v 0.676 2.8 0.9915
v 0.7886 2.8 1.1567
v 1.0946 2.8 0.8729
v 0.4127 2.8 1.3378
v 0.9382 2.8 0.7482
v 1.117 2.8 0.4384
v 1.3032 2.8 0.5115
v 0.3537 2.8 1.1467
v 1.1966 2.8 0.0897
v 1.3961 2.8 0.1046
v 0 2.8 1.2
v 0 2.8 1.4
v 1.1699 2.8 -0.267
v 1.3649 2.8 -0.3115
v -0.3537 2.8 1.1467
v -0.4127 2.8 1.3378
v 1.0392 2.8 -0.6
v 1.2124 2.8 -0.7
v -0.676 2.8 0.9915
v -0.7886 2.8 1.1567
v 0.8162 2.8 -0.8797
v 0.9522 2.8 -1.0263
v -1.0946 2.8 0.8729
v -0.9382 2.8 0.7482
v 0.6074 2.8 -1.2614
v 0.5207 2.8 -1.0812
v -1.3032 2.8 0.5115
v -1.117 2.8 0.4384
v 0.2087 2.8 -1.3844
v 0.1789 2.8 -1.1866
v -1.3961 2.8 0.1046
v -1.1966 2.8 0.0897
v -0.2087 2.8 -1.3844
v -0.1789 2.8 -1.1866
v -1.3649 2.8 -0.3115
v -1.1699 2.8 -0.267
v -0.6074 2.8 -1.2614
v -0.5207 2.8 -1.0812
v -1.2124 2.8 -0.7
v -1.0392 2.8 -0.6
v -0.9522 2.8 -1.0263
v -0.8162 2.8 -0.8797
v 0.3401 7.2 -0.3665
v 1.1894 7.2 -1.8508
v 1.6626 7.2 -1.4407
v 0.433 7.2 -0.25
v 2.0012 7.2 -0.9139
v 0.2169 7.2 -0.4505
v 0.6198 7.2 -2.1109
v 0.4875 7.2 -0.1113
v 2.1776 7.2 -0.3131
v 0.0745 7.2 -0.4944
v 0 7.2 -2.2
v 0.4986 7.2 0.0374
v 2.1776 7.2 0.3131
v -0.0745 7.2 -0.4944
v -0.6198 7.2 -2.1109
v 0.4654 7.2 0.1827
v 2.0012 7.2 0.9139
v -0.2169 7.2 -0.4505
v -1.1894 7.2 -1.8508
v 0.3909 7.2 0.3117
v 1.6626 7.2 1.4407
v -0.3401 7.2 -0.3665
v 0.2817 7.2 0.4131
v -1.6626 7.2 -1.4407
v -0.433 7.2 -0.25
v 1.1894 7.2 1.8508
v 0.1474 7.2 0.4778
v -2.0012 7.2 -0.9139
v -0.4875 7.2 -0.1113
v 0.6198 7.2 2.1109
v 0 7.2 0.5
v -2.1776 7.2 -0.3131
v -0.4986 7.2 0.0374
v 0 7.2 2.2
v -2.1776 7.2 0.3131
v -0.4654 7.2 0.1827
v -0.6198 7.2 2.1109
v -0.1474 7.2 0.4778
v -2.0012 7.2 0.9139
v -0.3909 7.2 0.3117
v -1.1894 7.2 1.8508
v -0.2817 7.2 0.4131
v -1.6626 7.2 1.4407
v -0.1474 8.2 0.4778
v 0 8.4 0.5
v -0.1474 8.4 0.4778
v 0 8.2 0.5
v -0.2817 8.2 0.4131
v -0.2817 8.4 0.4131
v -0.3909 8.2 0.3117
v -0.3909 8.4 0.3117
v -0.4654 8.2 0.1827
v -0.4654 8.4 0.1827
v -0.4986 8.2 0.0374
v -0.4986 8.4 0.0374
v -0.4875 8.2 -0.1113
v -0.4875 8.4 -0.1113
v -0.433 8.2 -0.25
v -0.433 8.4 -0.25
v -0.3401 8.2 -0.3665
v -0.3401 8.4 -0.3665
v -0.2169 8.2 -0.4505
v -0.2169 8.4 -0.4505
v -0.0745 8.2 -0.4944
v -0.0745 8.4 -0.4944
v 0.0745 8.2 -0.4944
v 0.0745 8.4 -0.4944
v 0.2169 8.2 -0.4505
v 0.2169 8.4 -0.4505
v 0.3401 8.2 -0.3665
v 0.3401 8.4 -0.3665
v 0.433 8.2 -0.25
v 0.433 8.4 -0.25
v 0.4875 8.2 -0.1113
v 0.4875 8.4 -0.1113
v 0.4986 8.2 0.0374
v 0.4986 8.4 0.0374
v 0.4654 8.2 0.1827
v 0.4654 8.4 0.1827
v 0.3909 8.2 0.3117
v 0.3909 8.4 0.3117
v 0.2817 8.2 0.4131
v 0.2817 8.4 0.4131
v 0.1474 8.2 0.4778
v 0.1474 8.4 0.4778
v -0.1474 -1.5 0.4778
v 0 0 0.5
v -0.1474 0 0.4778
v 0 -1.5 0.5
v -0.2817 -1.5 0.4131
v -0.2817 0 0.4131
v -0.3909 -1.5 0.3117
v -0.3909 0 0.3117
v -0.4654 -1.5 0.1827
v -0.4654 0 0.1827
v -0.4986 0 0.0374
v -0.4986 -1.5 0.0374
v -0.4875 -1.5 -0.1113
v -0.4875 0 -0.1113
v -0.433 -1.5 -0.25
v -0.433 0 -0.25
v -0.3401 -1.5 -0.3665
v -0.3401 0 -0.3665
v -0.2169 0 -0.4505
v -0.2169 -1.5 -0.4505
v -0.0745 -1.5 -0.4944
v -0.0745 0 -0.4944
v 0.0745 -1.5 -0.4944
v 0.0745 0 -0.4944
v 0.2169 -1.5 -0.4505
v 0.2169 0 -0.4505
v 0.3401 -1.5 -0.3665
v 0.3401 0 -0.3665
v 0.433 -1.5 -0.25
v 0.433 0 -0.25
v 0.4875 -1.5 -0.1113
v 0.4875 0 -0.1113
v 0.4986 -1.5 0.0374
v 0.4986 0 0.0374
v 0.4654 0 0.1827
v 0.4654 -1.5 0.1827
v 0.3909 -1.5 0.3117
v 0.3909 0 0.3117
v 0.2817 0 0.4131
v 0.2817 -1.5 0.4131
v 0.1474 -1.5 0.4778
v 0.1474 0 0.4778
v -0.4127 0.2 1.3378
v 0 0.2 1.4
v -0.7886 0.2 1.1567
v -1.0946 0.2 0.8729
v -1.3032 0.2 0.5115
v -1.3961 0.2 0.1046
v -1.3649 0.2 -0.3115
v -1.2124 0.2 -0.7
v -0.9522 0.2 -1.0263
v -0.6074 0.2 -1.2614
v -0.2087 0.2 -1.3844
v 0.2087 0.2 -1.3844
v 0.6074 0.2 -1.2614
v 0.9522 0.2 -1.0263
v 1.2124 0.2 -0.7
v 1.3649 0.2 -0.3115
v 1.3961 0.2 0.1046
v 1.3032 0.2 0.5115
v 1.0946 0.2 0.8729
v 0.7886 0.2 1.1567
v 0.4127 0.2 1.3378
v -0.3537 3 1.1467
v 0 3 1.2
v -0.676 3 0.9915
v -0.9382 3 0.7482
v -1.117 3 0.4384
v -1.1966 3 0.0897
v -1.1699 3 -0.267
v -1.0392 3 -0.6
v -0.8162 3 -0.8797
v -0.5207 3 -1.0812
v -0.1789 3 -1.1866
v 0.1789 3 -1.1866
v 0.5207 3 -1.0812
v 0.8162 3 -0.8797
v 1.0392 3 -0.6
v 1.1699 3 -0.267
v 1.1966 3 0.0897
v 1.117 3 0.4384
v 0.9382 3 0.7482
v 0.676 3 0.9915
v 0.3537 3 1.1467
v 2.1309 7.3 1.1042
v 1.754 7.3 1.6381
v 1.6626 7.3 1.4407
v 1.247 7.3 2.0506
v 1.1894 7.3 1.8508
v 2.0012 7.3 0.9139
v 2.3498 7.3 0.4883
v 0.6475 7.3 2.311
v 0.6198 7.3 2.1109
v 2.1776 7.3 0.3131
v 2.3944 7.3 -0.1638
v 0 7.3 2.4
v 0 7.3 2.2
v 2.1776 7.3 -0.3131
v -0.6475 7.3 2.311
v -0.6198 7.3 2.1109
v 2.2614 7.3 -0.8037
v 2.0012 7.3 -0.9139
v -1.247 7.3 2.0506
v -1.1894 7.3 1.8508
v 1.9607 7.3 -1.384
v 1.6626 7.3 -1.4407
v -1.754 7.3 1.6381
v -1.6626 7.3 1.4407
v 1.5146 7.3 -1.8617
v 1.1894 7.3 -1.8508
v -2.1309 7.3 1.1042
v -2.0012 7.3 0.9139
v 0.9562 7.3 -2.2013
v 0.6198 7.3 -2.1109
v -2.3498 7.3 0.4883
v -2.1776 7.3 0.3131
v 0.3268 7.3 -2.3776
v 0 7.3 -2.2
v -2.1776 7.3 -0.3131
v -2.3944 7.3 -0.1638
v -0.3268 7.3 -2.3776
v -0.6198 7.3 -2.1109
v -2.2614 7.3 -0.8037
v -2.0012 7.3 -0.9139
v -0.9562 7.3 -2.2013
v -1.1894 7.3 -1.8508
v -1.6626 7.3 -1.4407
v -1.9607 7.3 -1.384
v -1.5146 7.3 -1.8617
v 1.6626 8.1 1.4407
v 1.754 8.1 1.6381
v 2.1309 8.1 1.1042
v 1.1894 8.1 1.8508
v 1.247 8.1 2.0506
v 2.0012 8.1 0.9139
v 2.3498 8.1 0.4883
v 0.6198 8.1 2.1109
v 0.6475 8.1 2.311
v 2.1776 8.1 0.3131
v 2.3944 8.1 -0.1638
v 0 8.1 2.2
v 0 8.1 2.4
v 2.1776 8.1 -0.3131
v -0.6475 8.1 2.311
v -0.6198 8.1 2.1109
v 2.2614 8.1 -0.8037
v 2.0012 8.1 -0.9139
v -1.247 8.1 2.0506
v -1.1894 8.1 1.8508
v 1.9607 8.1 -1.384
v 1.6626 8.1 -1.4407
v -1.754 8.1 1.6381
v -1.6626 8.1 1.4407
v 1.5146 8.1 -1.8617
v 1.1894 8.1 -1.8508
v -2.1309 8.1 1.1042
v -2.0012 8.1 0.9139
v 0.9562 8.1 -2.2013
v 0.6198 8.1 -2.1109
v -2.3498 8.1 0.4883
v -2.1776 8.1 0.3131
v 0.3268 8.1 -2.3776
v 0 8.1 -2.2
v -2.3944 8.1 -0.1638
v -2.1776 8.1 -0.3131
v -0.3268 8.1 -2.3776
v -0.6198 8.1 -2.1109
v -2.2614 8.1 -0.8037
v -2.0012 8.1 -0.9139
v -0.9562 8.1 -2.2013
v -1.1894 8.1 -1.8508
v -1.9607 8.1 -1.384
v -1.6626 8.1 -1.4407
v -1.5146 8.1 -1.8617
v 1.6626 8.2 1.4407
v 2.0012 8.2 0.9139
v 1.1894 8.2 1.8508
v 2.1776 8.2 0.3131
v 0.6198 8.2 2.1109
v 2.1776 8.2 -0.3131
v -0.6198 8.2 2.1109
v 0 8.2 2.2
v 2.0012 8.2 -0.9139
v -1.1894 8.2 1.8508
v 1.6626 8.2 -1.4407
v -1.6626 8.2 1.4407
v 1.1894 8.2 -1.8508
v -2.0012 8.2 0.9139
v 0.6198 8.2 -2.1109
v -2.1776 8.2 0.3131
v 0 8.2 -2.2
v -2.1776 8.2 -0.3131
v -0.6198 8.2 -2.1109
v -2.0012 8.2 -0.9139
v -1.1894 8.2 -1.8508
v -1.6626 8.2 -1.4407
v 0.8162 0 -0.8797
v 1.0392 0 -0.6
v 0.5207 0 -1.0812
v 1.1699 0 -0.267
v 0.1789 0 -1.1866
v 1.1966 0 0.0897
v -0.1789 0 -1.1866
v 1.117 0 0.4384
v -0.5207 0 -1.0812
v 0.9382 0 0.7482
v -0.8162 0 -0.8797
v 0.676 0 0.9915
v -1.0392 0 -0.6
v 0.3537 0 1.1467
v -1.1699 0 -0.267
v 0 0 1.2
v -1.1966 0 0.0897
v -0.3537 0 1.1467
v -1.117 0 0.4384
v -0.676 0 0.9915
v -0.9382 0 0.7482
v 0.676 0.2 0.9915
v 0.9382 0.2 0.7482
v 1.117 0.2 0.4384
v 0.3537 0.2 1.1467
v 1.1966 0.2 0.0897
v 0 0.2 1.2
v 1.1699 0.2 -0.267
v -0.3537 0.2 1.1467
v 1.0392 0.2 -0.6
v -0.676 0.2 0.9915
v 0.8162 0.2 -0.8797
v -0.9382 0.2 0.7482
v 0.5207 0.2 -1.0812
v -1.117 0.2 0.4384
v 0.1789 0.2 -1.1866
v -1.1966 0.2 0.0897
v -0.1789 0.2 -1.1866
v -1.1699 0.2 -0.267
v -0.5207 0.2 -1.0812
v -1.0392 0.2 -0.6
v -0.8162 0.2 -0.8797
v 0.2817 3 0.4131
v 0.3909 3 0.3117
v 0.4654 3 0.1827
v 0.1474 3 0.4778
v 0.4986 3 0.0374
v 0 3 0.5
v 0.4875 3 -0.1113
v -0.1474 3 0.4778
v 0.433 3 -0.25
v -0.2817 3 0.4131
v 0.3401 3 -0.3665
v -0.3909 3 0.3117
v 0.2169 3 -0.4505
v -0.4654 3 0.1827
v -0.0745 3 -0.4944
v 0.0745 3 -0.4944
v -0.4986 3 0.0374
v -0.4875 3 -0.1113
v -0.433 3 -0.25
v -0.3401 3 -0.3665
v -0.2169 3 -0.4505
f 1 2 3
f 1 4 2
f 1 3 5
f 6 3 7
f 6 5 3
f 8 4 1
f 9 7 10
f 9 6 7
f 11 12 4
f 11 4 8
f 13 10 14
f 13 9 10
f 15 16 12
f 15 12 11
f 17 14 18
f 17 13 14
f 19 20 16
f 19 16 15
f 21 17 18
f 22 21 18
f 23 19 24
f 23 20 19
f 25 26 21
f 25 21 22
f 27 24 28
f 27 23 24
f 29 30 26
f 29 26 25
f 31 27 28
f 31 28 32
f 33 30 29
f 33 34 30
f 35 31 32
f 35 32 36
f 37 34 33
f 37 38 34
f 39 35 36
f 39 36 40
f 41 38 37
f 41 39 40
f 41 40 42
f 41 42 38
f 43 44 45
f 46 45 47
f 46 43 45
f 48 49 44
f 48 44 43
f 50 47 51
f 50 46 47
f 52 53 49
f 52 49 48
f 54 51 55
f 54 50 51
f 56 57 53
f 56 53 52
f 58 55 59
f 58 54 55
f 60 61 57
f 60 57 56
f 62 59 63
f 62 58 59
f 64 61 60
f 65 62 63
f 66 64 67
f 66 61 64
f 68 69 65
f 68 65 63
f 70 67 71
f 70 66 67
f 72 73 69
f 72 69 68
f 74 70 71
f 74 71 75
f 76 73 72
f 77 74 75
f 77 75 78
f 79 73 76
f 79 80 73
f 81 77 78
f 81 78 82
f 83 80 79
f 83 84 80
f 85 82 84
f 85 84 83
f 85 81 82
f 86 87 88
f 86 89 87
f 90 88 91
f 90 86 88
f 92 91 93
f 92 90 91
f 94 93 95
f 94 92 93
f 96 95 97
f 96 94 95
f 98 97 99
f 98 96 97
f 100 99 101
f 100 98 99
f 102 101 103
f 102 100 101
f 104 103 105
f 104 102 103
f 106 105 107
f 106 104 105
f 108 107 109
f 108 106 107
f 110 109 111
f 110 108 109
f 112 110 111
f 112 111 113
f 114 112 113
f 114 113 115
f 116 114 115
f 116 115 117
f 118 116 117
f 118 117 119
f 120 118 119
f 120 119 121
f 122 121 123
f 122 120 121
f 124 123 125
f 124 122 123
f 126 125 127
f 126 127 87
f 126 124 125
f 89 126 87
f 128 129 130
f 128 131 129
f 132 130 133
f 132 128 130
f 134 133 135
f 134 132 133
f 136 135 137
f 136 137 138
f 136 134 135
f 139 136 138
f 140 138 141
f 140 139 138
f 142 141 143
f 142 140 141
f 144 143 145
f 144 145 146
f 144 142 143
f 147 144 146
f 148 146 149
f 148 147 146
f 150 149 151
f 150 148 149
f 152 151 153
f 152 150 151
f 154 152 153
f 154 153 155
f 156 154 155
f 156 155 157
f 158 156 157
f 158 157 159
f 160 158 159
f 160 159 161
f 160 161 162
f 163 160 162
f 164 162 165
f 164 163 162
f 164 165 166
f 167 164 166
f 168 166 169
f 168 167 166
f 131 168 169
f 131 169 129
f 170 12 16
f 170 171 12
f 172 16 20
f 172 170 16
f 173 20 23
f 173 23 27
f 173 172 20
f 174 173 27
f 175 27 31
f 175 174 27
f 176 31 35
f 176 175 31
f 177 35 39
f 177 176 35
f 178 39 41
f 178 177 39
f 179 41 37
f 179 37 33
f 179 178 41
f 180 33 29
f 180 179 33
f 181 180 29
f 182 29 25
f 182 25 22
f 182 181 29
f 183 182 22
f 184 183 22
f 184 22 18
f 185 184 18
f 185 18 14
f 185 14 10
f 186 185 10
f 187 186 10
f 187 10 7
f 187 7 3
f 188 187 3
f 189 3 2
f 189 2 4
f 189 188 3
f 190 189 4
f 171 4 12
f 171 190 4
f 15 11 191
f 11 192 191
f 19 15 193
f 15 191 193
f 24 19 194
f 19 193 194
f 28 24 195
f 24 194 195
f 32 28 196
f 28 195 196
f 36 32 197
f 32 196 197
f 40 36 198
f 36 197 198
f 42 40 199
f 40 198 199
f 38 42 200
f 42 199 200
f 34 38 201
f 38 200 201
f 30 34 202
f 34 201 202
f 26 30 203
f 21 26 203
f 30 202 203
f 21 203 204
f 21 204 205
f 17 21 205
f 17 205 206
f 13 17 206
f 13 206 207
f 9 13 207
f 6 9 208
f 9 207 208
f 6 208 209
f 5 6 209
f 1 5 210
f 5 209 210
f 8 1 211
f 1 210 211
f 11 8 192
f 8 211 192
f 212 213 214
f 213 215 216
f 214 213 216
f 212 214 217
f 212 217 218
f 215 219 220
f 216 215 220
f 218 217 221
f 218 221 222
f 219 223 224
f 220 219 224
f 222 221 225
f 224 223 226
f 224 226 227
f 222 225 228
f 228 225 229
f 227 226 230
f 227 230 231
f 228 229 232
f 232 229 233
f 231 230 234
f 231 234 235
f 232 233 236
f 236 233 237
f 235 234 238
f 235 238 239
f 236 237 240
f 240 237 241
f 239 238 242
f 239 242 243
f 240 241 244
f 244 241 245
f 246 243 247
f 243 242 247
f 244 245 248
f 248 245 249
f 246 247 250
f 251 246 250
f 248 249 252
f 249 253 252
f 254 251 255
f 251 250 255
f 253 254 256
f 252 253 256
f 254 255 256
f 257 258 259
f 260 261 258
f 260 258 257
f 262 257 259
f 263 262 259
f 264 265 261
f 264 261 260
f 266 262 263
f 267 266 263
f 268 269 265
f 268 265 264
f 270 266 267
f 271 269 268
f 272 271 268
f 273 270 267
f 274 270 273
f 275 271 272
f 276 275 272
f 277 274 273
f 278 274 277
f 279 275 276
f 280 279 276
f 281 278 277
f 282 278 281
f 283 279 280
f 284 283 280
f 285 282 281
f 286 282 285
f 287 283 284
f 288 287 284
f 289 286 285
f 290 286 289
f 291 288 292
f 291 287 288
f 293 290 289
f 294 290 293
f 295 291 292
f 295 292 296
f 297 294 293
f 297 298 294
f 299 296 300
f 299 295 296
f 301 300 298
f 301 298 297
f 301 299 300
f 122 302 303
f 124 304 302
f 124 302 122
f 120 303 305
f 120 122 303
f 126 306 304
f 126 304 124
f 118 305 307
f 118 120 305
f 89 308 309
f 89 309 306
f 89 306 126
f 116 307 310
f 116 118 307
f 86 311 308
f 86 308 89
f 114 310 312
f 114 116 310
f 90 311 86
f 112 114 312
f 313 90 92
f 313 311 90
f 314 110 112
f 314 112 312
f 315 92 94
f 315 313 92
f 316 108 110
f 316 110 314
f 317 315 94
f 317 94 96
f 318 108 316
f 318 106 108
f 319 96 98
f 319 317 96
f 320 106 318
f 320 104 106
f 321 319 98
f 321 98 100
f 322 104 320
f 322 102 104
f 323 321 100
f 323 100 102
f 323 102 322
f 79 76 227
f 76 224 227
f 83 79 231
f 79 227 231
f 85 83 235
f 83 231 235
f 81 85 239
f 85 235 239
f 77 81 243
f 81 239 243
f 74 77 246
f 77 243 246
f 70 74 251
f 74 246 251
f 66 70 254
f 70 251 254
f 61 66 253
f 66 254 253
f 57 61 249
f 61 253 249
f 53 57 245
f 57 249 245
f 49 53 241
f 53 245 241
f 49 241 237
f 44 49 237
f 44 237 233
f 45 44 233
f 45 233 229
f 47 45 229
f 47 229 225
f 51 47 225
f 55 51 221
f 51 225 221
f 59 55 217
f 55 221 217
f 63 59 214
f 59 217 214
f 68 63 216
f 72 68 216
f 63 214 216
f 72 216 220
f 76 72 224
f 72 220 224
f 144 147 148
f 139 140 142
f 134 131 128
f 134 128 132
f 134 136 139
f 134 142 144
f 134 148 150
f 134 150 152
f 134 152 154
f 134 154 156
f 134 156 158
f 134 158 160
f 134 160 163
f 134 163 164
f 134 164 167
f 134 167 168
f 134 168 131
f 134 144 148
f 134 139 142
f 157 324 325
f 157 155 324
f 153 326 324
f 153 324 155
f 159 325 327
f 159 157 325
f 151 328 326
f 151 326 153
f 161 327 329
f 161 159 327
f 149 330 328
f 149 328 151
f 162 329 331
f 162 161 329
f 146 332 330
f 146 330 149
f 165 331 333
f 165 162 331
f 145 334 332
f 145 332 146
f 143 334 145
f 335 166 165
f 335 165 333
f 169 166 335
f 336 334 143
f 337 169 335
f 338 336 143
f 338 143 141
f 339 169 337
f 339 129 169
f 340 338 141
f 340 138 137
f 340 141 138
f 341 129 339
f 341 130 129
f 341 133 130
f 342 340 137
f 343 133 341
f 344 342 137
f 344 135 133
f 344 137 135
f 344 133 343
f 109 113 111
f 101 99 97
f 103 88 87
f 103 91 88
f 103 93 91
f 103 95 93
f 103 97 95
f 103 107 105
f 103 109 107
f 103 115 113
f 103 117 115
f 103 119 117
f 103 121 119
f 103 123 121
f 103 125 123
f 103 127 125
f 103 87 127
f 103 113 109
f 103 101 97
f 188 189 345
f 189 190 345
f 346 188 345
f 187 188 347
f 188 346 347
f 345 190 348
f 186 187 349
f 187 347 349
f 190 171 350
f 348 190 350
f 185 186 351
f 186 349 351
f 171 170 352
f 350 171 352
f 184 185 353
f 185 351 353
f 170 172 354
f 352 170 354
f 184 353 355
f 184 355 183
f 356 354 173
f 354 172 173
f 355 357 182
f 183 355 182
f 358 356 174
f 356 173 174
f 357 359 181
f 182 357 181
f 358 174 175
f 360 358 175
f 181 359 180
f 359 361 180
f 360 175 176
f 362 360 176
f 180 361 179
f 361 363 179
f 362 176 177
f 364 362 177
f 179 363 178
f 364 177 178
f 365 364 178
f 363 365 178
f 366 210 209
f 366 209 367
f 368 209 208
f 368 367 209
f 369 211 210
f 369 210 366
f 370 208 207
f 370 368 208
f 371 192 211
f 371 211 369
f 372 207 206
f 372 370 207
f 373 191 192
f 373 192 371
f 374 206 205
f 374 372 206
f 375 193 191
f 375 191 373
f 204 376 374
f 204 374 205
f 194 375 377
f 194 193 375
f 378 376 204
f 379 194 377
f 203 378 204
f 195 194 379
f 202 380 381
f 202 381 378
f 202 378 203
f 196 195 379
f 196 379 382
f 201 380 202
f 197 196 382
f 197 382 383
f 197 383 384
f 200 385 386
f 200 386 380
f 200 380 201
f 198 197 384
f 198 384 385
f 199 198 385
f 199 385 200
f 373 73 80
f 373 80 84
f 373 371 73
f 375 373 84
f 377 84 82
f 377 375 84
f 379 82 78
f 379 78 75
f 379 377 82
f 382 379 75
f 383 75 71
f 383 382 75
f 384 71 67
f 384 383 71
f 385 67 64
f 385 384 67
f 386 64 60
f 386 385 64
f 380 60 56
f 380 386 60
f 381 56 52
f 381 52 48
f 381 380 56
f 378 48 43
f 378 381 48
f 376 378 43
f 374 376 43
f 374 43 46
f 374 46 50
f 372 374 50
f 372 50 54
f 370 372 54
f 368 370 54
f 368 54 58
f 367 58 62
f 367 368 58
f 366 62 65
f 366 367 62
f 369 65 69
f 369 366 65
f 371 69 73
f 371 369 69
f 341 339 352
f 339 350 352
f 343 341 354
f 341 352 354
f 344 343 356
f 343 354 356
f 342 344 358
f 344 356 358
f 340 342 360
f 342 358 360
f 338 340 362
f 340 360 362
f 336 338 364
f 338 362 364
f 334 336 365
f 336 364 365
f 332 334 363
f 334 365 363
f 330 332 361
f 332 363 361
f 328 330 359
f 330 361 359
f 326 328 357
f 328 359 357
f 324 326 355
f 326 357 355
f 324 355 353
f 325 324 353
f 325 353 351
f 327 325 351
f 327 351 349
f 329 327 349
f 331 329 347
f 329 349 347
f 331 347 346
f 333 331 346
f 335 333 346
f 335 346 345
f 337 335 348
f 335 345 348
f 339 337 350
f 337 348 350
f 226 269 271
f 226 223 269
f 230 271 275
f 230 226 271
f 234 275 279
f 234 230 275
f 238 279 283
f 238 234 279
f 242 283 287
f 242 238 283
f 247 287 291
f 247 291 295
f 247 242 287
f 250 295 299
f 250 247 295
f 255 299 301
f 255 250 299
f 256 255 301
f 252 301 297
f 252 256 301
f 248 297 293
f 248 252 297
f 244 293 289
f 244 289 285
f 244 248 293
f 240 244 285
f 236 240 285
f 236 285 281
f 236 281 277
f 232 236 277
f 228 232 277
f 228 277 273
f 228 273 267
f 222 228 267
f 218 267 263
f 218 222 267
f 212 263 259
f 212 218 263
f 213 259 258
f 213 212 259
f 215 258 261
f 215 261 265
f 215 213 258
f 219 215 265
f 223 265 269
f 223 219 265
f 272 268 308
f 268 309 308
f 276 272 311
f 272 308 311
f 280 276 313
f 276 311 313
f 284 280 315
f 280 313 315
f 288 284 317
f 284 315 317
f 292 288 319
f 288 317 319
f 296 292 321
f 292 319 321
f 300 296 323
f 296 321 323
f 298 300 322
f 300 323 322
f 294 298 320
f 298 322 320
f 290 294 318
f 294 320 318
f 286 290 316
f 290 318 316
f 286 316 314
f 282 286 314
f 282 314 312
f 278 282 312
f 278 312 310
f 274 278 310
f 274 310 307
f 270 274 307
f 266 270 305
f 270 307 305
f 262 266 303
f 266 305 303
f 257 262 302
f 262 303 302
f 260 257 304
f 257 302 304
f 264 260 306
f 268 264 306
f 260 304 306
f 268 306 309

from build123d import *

# Parameters (mm, degrees)
F2_W = 0.2
F2_H = 0.2
F4_W = 0.1
F4_H = 0.2


with BuildPart() as f1:
    # F0 (on Right) → F1 (revolve)
    with BuildSketch(Plane.YZ):
        Polygon((-1.5, 0.5), (-1.5, 0), (8.4, 0), (8.4, 0.5), (8.2, 0.5), (8.2, 2.4), (7.2, 2.4), (7.2, 0.5), (3, 0.5), (3, 1.4), (0, 1.4), (0, 0.5), align=None)
    revolve(axis=Axis((0, 3.45, 0), (0, -1, 0)))

    # F2 (on Right) → F3 (revolve, cut)
    with BuildSketch(Plane.YZ):
        with Locations((2.9, 1.3)):
            Rectangle(F2_W, F2_H)
        with Locations((0.1, 1.3)):
            Rectangle(F2_W, F2_H)
    revolve(axis=Axis((0, 3.45, 0), (0, -1, 0)), mode=Mode.SUBTRACT)

    # F4 (on Right) → F5 (revolve, cut)
    with BuildSketch(Plane.YZ):
        with Locations((8.15, 2.3)):
            Rectangle(F4_W, F4_H)
        with Locations((7.25, 2.3)):
            Rectangle(F4_W, F4_H)
    revolve(axis=Axis((0, 3.45, 0), (0, -1, 0)), mode=Mode.SUBTRACT)


solid = f1.part
